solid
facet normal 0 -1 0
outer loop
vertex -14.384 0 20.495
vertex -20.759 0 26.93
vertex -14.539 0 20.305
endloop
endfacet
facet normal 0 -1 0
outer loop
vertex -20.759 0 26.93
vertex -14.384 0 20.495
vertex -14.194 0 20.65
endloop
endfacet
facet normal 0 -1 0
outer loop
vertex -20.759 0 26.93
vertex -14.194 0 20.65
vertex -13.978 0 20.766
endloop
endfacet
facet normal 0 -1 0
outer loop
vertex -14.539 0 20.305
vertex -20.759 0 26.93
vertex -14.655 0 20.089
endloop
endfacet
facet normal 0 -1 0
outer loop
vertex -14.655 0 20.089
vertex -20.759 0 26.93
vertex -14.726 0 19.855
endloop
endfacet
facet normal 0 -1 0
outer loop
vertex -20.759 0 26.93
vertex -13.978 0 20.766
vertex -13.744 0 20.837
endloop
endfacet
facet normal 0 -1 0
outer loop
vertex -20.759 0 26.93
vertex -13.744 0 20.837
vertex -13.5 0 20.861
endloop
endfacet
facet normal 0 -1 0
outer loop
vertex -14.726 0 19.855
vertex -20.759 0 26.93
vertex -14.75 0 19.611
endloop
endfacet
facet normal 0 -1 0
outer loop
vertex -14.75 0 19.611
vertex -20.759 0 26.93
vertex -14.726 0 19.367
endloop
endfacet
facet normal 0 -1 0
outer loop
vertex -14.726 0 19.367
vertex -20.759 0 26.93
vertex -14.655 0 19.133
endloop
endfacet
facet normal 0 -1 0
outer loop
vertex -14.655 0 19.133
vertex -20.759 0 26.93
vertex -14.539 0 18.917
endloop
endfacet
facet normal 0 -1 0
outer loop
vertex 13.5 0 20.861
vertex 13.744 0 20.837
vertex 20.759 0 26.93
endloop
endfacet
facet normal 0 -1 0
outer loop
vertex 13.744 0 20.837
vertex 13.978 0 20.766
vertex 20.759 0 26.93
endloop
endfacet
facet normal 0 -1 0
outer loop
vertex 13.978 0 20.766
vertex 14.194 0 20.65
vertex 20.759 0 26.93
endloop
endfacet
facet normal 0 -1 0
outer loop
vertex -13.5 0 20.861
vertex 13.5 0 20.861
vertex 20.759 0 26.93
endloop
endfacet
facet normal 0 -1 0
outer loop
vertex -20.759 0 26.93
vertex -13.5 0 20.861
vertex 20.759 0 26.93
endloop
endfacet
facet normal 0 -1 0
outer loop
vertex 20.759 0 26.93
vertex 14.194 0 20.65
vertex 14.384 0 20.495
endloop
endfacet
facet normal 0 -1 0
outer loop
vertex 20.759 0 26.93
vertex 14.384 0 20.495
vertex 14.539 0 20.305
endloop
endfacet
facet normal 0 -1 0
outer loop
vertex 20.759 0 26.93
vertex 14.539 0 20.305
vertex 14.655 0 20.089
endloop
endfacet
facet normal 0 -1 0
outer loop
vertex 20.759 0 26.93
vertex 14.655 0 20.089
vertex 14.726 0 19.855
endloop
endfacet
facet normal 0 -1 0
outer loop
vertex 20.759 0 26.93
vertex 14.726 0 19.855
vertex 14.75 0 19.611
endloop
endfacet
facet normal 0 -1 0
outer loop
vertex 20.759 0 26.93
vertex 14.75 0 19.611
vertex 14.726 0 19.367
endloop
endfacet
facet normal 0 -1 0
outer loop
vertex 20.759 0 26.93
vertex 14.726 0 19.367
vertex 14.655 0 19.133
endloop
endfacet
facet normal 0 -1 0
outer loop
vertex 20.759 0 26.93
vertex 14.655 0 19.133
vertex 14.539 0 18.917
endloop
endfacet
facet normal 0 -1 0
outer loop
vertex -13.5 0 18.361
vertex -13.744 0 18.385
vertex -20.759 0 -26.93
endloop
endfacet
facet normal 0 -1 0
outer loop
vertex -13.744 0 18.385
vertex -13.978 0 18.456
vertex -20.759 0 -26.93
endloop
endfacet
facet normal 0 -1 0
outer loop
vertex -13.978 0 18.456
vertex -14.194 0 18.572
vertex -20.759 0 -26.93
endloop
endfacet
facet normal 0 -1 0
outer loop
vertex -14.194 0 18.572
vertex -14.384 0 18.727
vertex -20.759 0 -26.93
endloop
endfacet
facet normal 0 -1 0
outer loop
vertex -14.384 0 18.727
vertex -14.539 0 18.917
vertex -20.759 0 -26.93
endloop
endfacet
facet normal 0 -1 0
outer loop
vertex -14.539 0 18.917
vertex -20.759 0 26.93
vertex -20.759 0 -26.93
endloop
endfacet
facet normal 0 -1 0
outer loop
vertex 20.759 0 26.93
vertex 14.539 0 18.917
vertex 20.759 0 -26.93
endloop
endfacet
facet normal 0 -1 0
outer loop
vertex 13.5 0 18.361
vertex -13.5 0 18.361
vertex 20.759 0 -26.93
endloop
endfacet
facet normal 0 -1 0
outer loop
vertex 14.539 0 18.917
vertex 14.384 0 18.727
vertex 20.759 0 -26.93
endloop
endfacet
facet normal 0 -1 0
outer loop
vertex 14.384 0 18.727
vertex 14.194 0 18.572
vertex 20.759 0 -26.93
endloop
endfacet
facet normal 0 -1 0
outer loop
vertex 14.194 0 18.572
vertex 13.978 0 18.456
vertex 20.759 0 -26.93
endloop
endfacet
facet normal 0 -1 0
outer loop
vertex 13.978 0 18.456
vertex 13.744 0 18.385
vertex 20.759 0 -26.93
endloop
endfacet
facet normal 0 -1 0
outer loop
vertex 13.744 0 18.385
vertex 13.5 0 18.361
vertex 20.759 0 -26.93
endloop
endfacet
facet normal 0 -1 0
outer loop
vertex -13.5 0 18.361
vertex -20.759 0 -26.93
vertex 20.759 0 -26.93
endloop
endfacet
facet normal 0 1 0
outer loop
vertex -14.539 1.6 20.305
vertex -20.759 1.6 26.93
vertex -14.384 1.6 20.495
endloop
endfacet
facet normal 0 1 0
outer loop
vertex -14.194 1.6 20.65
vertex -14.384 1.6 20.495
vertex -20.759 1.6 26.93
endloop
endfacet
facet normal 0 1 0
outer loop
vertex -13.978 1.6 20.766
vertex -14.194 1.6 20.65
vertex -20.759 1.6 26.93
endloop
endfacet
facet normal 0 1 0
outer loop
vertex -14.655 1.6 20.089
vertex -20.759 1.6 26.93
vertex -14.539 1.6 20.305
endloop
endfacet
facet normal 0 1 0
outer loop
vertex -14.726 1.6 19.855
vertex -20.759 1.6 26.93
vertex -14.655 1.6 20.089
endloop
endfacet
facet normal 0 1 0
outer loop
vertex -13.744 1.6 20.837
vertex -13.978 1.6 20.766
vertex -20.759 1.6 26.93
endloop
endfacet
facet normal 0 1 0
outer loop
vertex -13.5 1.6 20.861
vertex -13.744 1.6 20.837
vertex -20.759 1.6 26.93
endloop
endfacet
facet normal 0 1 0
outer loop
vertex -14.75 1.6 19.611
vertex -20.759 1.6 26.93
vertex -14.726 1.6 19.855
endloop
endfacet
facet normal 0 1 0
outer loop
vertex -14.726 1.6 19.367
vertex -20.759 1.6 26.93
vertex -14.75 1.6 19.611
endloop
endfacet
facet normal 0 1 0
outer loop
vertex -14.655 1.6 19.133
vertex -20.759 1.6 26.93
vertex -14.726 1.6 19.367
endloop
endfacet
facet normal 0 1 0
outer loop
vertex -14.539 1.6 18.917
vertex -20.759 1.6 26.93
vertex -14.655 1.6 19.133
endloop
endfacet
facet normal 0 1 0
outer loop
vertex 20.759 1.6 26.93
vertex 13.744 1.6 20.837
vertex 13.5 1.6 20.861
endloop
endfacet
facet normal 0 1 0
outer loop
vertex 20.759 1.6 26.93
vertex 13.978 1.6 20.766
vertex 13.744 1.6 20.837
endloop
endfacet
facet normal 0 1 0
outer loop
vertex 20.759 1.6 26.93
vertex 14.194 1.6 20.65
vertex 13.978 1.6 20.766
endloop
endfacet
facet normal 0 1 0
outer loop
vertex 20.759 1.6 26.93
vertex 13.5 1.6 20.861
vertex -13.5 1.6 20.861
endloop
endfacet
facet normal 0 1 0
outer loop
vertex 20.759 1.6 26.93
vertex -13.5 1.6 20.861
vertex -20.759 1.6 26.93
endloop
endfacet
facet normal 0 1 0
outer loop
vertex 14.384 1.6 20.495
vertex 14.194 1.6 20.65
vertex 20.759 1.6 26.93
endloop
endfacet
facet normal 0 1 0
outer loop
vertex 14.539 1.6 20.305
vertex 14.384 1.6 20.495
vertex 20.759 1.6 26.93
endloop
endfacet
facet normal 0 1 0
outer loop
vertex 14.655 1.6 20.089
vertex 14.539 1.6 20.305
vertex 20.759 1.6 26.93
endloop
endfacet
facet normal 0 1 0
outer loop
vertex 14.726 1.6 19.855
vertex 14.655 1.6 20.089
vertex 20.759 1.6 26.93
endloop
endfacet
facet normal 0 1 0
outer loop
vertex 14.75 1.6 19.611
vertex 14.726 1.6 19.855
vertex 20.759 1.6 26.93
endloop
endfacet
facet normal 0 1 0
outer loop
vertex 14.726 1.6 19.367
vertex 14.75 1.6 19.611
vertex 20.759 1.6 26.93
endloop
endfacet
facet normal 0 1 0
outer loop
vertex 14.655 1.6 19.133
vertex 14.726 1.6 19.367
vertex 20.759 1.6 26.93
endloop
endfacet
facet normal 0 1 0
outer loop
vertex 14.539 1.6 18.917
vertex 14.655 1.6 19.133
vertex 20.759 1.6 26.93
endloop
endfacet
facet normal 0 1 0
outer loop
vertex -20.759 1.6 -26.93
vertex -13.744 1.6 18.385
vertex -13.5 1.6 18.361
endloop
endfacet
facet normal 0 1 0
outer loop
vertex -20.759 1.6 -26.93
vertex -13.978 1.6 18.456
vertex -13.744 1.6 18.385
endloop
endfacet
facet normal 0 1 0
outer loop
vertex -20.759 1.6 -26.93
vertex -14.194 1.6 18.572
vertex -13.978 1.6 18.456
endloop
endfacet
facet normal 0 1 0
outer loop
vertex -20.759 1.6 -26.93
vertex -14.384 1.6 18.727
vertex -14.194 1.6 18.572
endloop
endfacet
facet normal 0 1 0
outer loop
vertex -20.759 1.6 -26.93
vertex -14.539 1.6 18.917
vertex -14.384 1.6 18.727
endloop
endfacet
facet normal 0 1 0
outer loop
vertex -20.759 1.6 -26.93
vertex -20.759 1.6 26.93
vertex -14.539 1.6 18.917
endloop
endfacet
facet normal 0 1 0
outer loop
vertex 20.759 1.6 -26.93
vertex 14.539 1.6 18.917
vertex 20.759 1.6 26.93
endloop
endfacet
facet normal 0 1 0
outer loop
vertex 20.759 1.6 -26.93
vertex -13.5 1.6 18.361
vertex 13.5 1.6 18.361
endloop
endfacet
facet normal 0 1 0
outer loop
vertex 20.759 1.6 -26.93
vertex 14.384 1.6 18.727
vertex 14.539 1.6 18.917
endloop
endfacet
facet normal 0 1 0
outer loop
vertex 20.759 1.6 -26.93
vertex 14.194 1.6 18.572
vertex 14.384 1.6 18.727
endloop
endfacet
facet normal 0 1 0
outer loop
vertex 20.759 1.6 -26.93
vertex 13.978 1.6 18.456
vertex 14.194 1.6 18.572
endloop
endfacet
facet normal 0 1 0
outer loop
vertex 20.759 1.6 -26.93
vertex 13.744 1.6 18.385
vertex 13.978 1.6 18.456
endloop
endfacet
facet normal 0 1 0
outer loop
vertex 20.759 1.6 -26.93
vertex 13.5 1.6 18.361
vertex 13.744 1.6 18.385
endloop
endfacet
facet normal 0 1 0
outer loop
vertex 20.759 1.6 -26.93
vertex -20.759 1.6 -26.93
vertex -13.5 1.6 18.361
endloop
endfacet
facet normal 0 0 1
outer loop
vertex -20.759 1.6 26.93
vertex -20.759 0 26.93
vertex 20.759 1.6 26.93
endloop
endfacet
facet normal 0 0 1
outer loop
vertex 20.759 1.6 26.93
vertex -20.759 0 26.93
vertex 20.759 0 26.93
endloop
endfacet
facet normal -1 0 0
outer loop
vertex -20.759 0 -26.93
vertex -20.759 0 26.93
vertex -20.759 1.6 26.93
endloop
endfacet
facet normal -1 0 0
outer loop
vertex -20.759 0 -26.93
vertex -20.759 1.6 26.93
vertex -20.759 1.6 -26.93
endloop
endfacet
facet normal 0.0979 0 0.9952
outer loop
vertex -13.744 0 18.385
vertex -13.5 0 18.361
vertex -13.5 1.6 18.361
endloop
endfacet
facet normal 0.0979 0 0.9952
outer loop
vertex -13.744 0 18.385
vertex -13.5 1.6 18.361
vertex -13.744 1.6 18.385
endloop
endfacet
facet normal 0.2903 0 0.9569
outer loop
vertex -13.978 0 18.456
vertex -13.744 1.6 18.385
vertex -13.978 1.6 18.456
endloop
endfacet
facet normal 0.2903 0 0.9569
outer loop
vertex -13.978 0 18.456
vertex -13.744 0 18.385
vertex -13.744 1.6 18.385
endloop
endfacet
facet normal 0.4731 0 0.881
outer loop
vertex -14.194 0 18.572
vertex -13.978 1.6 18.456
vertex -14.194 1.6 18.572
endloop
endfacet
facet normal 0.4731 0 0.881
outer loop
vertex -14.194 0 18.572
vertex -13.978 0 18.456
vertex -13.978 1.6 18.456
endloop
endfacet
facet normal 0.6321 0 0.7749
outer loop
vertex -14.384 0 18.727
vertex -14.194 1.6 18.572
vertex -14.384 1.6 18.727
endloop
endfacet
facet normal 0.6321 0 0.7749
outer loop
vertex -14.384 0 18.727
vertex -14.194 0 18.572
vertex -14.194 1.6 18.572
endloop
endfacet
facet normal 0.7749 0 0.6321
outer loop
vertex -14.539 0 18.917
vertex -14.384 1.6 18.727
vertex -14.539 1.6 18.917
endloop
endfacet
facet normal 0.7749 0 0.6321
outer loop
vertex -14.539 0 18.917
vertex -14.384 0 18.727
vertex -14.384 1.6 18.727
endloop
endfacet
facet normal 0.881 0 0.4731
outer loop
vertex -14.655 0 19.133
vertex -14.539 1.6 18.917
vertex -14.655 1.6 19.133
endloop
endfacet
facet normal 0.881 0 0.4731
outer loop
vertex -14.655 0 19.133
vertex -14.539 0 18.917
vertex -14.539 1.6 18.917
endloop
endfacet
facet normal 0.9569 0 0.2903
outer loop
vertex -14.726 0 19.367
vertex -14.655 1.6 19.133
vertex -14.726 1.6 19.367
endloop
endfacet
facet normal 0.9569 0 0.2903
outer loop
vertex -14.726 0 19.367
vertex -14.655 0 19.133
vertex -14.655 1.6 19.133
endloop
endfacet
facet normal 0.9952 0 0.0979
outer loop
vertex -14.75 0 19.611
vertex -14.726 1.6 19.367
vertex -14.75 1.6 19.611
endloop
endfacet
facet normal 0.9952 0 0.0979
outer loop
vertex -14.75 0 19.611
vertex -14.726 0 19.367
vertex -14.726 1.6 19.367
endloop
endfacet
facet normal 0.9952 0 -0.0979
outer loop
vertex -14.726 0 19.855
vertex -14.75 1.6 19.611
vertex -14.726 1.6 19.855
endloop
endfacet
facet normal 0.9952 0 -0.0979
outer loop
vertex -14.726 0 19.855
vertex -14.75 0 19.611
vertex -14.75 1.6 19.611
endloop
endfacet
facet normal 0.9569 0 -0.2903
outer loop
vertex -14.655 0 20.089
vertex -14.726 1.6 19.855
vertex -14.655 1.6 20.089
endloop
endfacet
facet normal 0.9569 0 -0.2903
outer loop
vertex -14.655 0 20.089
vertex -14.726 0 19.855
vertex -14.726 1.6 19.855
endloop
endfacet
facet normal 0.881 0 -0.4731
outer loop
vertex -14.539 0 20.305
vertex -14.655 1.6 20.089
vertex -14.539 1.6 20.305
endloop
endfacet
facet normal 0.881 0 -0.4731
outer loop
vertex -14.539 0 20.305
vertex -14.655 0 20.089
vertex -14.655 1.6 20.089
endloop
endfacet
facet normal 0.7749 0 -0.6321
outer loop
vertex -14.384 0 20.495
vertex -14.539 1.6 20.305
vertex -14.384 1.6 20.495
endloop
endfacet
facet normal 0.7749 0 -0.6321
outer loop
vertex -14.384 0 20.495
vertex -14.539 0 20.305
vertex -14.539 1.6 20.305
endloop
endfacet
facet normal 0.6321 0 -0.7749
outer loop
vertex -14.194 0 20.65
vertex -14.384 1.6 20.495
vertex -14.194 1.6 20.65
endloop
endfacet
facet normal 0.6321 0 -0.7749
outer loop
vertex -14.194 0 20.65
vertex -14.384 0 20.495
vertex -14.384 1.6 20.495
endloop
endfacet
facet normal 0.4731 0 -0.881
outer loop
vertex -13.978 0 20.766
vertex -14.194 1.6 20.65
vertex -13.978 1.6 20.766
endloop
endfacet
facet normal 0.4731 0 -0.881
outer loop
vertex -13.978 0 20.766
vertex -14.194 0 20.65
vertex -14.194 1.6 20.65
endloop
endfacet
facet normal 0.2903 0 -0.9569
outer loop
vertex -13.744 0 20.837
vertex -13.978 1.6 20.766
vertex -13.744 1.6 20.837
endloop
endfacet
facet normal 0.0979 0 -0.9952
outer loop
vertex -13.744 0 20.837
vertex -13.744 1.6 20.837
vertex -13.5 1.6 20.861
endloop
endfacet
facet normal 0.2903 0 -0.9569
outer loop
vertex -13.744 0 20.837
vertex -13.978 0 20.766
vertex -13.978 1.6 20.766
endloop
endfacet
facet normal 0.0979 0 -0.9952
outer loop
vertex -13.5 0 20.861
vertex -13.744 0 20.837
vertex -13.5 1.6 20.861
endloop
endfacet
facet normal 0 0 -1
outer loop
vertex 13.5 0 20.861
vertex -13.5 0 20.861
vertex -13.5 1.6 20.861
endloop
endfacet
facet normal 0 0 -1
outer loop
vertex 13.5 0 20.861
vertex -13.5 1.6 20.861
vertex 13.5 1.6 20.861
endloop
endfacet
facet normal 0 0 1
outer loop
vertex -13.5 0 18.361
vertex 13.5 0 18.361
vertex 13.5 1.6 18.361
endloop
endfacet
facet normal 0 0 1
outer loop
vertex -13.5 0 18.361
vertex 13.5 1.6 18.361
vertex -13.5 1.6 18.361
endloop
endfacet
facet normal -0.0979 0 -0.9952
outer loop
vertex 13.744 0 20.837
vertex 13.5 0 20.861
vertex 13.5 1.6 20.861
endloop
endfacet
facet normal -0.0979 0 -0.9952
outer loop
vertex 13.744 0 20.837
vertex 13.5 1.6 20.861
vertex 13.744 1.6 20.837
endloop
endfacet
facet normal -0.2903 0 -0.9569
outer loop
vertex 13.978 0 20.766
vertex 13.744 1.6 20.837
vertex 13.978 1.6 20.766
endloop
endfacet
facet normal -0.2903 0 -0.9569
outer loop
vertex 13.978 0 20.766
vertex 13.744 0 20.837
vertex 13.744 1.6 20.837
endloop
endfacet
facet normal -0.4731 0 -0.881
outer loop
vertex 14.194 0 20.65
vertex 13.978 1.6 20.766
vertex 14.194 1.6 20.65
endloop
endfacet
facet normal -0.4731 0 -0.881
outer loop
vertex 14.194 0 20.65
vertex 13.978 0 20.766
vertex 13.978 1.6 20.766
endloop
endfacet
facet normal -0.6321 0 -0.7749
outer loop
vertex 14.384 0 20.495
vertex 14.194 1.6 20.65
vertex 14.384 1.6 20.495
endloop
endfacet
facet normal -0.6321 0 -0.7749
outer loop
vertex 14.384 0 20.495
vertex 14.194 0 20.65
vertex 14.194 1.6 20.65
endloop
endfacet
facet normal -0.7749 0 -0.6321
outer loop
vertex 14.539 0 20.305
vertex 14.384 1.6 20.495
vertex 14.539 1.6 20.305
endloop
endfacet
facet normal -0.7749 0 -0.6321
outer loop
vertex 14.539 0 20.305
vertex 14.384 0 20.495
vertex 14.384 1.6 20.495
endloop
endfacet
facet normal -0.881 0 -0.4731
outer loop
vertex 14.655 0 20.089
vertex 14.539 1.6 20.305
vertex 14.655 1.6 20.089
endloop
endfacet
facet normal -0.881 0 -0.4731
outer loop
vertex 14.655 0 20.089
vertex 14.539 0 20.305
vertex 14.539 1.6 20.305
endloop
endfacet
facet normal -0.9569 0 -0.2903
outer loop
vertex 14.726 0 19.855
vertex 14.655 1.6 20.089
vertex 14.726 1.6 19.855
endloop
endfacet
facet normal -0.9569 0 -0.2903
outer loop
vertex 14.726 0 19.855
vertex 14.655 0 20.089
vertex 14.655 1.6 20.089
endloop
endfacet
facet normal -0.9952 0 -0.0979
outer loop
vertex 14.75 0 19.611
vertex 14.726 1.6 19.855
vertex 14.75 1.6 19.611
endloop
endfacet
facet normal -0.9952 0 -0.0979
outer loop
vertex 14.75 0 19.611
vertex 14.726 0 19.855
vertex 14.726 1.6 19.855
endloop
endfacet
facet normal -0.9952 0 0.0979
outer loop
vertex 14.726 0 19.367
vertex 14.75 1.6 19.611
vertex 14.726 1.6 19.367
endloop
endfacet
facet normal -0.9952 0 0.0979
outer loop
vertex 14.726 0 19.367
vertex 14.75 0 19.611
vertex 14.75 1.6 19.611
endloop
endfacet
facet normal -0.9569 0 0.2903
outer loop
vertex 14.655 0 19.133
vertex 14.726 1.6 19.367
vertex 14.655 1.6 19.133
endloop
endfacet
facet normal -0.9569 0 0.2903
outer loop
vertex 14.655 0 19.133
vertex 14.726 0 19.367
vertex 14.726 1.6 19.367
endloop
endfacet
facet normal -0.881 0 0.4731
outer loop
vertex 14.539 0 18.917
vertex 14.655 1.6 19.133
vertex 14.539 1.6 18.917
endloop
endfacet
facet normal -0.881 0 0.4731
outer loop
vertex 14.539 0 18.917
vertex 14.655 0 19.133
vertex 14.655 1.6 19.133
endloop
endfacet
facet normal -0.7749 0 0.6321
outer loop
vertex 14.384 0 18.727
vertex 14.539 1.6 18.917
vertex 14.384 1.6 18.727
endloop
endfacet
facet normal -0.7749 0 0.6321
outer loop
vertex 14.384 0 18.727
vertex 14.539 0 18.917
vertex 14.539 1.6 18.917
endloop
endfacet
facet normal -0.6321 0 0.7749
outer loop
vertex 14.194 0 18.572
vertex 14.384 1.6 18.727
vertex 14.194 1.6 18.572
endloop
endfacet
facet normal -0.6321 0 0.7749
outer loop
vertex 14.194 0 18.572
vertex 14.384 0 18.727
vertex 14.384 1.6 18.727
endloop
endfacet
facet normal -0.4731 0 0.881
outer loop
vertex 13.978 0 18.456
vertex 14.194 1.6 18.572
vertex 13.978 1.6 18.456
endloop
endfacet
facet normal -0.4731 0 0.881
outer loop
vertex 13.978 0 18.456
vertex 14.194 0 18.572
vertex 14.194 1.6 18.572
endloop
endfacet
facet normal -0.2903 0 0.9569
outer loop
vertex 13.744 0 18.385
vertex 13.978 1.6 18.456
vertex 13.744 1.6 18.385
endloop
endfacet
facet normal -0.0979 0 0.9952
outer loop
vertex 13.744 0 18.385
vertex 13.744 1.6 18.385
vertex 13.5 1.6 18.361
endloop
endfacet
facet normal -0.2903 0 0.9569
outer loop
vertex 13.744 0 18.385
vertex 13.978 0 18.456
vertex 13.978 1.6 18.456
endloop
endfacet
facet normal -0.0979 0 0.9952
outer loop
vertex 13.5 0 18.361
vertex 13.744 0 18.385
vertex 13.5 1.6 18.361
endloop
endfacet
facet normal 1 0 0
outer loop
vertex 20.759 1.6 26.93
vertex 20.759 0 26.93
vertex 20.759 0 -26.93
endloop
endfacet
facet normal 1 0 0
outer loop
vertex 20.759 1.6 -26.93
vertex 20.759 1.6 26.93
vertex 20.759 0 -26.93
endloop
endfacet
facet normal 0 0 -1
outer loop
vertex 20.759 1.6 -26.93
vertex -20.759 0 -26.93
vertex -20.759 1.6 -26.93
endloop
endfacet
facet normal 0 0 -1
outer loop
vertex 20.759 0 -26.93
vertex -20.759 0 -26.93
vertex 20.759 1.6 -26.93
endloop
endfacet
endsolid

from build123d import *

# Parameters (mm, degrees)
SKIZZE1_W                       = 41.517188714
SKIZZE1_H                       = 53.860351018
AUFSATZ_LINEAR_AUSTRAGEN1_DEPTH = 1.6


with BuildPart() as part:
    # Skizze1 → Aufsatz-Linear austragen1 (new body)
    with BuildSketch(Plane(origin=(0, 0, 0), x_dir=(1, 0, 0), z_dir=(0, 1, 0))):
        Rectangle(SKIZZE1_W, SKIZZE1_H)
        with BuildLine():
            ThreePointArc((-13.5, -18.360991054), (-14.75, -19.610991054), (-13.5, -20.860991054))
            Line((-13.5, -20.860991054), (13.5, -20.860991054))
            ThreePointArc((13.5, -20.860991054), (14.75, -19.610991054), (13.5, -18.360991054))
            Line((13.5, -18.360991054), (-13.5, -18.360991054))
        make_face(mode=Mode.SUBTRACT)
    extrude(amount=AUFSATZ_LINEAR_AUSTRAGEN1_DEPTH)


solid = part.part
